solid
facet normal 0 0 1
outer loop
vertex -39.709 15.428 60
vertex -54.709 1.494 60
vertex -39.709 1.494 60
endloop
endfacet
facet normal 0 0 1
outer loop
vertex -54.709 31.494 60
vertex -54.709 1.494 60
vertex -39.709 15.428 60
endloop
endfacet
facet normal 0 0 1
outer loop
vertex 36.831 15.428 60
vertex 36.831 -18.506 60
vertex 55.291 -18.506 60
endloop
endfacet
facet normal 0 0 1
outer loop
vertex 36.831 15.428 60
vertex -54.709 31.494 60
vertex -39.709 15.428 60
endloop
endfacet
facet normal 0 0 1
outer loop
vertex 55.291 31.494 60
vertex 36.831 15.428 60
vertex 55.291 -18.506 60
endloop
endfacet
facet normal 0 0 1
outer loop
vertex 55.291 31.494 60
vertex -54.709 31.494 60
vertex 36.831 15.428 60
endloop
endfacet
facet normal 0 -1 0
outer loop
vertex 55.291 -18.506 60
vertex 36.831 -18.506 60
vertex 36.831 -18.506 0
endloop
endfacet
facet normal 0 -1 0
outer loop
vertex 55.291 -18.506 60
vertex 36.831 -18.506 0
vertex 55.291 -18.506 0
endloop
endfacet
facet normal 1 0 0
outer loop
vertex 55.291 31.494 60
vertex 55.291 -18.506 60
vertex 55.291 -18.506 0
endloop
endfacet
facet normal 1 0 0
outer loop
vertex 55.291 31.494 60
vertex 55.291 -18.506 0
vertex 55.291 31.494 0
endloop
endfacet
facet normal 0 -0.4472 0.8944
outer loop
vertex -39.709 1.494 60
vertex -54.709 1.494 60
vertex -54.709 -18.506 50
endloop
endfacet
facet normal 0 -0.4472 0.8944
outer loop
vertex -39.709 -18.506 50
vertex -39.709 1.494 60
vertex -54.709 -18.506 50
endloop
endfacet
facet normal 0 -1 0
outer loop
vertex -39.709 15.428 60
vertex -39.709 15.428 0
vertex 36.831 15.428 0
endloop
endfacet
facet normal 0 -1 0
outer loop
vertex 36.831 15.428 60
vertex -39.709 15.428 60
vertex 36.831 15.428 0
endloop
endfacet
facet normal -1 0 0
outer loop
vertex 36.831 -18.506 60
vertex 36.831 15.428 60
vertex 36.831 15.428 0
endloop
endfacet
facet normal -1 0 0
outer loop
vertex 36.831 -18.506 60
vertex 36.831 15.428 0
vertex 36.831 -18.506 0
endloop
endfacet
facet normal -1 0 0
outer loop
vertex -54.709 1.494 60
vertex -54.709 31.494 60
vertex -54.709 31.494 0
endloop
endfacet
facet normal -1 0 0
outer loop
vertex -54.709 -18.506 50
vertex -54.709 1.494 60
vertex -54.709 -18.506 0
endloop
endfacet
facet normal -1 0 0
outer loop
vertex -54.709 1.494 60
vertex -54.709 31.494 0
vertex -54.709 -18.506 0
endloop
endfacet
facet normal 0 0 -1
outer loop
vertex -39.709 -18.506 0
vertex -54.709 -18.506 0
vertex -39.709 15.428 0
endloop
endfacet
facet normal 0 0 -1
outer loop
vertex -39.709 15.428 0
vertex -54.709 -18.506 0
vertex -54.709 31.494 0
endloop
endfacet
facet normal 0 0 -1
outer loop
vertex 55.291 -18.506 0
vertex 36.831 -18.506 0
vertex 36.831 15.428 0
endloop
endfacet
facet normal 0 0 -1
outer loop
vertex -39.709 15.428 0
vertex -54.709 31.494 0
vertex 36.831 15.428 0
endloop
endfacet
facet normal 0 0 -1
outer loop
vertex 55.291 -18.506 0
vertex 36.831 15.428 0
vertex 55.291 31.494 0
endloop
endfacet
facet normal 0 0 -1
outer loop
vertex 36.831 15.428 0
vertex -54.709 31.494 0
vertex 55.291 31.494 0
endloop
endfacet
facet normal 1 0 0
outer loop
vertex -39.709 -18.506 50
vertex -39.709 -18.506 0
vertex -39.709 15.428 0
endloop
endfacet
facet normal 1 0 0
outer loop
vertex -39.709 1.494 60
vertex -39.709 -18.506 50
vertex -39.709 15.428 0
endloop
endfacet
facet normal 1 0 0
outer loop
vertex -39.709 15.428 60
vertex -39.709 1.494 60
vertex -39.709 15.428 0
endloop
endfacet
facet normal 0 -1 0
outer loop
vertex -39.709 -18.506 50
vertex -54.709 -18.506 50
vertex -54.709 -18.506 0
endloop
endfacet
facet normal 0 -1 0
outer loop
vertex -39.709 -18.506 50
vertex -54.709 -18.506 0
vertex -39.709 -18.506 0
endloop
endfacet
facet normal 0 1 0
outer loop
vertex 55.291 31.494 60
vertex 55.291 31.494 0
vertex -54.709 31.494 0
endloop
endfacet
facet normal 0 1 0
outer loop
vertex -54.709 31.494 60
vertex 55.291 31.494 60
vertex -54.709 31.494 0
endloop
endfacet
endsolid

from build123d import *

# Parameters (mm, degrees)
F1_DEPTH = 60
F3_DEPTH = 25


with BuildPart() as f1:
    # F0 (on Top) → F1 (new body)
    with BuildSketch(Plane.XY):
        Polygon((-54.709053, 31.494253), (-54.709053, -18.505747), (-39.709053, -18.505747), (-39.709053, 15.428343), (36.831179, 15.428343), (36.831179, -18.505747), (55.290947, -18.505747), (55.290947, 31.494253), align=None)
    extrude(amount=F1_DEPTH)

    # F2 (on face) → F3 (cut)
    with BuildSketch(Plane(origin=(-54.709053, 0, 0), x_dir=(0, -1, 0), z_dir=(-1, 0, 0))):
        Polygon((18.505747, 60), (-1.494253, 60), (18.505747, 50), align=None)
    extrude(amount=-F3_DEPTH, mode=Mode.SUBTRACT)


solid = f1.part
